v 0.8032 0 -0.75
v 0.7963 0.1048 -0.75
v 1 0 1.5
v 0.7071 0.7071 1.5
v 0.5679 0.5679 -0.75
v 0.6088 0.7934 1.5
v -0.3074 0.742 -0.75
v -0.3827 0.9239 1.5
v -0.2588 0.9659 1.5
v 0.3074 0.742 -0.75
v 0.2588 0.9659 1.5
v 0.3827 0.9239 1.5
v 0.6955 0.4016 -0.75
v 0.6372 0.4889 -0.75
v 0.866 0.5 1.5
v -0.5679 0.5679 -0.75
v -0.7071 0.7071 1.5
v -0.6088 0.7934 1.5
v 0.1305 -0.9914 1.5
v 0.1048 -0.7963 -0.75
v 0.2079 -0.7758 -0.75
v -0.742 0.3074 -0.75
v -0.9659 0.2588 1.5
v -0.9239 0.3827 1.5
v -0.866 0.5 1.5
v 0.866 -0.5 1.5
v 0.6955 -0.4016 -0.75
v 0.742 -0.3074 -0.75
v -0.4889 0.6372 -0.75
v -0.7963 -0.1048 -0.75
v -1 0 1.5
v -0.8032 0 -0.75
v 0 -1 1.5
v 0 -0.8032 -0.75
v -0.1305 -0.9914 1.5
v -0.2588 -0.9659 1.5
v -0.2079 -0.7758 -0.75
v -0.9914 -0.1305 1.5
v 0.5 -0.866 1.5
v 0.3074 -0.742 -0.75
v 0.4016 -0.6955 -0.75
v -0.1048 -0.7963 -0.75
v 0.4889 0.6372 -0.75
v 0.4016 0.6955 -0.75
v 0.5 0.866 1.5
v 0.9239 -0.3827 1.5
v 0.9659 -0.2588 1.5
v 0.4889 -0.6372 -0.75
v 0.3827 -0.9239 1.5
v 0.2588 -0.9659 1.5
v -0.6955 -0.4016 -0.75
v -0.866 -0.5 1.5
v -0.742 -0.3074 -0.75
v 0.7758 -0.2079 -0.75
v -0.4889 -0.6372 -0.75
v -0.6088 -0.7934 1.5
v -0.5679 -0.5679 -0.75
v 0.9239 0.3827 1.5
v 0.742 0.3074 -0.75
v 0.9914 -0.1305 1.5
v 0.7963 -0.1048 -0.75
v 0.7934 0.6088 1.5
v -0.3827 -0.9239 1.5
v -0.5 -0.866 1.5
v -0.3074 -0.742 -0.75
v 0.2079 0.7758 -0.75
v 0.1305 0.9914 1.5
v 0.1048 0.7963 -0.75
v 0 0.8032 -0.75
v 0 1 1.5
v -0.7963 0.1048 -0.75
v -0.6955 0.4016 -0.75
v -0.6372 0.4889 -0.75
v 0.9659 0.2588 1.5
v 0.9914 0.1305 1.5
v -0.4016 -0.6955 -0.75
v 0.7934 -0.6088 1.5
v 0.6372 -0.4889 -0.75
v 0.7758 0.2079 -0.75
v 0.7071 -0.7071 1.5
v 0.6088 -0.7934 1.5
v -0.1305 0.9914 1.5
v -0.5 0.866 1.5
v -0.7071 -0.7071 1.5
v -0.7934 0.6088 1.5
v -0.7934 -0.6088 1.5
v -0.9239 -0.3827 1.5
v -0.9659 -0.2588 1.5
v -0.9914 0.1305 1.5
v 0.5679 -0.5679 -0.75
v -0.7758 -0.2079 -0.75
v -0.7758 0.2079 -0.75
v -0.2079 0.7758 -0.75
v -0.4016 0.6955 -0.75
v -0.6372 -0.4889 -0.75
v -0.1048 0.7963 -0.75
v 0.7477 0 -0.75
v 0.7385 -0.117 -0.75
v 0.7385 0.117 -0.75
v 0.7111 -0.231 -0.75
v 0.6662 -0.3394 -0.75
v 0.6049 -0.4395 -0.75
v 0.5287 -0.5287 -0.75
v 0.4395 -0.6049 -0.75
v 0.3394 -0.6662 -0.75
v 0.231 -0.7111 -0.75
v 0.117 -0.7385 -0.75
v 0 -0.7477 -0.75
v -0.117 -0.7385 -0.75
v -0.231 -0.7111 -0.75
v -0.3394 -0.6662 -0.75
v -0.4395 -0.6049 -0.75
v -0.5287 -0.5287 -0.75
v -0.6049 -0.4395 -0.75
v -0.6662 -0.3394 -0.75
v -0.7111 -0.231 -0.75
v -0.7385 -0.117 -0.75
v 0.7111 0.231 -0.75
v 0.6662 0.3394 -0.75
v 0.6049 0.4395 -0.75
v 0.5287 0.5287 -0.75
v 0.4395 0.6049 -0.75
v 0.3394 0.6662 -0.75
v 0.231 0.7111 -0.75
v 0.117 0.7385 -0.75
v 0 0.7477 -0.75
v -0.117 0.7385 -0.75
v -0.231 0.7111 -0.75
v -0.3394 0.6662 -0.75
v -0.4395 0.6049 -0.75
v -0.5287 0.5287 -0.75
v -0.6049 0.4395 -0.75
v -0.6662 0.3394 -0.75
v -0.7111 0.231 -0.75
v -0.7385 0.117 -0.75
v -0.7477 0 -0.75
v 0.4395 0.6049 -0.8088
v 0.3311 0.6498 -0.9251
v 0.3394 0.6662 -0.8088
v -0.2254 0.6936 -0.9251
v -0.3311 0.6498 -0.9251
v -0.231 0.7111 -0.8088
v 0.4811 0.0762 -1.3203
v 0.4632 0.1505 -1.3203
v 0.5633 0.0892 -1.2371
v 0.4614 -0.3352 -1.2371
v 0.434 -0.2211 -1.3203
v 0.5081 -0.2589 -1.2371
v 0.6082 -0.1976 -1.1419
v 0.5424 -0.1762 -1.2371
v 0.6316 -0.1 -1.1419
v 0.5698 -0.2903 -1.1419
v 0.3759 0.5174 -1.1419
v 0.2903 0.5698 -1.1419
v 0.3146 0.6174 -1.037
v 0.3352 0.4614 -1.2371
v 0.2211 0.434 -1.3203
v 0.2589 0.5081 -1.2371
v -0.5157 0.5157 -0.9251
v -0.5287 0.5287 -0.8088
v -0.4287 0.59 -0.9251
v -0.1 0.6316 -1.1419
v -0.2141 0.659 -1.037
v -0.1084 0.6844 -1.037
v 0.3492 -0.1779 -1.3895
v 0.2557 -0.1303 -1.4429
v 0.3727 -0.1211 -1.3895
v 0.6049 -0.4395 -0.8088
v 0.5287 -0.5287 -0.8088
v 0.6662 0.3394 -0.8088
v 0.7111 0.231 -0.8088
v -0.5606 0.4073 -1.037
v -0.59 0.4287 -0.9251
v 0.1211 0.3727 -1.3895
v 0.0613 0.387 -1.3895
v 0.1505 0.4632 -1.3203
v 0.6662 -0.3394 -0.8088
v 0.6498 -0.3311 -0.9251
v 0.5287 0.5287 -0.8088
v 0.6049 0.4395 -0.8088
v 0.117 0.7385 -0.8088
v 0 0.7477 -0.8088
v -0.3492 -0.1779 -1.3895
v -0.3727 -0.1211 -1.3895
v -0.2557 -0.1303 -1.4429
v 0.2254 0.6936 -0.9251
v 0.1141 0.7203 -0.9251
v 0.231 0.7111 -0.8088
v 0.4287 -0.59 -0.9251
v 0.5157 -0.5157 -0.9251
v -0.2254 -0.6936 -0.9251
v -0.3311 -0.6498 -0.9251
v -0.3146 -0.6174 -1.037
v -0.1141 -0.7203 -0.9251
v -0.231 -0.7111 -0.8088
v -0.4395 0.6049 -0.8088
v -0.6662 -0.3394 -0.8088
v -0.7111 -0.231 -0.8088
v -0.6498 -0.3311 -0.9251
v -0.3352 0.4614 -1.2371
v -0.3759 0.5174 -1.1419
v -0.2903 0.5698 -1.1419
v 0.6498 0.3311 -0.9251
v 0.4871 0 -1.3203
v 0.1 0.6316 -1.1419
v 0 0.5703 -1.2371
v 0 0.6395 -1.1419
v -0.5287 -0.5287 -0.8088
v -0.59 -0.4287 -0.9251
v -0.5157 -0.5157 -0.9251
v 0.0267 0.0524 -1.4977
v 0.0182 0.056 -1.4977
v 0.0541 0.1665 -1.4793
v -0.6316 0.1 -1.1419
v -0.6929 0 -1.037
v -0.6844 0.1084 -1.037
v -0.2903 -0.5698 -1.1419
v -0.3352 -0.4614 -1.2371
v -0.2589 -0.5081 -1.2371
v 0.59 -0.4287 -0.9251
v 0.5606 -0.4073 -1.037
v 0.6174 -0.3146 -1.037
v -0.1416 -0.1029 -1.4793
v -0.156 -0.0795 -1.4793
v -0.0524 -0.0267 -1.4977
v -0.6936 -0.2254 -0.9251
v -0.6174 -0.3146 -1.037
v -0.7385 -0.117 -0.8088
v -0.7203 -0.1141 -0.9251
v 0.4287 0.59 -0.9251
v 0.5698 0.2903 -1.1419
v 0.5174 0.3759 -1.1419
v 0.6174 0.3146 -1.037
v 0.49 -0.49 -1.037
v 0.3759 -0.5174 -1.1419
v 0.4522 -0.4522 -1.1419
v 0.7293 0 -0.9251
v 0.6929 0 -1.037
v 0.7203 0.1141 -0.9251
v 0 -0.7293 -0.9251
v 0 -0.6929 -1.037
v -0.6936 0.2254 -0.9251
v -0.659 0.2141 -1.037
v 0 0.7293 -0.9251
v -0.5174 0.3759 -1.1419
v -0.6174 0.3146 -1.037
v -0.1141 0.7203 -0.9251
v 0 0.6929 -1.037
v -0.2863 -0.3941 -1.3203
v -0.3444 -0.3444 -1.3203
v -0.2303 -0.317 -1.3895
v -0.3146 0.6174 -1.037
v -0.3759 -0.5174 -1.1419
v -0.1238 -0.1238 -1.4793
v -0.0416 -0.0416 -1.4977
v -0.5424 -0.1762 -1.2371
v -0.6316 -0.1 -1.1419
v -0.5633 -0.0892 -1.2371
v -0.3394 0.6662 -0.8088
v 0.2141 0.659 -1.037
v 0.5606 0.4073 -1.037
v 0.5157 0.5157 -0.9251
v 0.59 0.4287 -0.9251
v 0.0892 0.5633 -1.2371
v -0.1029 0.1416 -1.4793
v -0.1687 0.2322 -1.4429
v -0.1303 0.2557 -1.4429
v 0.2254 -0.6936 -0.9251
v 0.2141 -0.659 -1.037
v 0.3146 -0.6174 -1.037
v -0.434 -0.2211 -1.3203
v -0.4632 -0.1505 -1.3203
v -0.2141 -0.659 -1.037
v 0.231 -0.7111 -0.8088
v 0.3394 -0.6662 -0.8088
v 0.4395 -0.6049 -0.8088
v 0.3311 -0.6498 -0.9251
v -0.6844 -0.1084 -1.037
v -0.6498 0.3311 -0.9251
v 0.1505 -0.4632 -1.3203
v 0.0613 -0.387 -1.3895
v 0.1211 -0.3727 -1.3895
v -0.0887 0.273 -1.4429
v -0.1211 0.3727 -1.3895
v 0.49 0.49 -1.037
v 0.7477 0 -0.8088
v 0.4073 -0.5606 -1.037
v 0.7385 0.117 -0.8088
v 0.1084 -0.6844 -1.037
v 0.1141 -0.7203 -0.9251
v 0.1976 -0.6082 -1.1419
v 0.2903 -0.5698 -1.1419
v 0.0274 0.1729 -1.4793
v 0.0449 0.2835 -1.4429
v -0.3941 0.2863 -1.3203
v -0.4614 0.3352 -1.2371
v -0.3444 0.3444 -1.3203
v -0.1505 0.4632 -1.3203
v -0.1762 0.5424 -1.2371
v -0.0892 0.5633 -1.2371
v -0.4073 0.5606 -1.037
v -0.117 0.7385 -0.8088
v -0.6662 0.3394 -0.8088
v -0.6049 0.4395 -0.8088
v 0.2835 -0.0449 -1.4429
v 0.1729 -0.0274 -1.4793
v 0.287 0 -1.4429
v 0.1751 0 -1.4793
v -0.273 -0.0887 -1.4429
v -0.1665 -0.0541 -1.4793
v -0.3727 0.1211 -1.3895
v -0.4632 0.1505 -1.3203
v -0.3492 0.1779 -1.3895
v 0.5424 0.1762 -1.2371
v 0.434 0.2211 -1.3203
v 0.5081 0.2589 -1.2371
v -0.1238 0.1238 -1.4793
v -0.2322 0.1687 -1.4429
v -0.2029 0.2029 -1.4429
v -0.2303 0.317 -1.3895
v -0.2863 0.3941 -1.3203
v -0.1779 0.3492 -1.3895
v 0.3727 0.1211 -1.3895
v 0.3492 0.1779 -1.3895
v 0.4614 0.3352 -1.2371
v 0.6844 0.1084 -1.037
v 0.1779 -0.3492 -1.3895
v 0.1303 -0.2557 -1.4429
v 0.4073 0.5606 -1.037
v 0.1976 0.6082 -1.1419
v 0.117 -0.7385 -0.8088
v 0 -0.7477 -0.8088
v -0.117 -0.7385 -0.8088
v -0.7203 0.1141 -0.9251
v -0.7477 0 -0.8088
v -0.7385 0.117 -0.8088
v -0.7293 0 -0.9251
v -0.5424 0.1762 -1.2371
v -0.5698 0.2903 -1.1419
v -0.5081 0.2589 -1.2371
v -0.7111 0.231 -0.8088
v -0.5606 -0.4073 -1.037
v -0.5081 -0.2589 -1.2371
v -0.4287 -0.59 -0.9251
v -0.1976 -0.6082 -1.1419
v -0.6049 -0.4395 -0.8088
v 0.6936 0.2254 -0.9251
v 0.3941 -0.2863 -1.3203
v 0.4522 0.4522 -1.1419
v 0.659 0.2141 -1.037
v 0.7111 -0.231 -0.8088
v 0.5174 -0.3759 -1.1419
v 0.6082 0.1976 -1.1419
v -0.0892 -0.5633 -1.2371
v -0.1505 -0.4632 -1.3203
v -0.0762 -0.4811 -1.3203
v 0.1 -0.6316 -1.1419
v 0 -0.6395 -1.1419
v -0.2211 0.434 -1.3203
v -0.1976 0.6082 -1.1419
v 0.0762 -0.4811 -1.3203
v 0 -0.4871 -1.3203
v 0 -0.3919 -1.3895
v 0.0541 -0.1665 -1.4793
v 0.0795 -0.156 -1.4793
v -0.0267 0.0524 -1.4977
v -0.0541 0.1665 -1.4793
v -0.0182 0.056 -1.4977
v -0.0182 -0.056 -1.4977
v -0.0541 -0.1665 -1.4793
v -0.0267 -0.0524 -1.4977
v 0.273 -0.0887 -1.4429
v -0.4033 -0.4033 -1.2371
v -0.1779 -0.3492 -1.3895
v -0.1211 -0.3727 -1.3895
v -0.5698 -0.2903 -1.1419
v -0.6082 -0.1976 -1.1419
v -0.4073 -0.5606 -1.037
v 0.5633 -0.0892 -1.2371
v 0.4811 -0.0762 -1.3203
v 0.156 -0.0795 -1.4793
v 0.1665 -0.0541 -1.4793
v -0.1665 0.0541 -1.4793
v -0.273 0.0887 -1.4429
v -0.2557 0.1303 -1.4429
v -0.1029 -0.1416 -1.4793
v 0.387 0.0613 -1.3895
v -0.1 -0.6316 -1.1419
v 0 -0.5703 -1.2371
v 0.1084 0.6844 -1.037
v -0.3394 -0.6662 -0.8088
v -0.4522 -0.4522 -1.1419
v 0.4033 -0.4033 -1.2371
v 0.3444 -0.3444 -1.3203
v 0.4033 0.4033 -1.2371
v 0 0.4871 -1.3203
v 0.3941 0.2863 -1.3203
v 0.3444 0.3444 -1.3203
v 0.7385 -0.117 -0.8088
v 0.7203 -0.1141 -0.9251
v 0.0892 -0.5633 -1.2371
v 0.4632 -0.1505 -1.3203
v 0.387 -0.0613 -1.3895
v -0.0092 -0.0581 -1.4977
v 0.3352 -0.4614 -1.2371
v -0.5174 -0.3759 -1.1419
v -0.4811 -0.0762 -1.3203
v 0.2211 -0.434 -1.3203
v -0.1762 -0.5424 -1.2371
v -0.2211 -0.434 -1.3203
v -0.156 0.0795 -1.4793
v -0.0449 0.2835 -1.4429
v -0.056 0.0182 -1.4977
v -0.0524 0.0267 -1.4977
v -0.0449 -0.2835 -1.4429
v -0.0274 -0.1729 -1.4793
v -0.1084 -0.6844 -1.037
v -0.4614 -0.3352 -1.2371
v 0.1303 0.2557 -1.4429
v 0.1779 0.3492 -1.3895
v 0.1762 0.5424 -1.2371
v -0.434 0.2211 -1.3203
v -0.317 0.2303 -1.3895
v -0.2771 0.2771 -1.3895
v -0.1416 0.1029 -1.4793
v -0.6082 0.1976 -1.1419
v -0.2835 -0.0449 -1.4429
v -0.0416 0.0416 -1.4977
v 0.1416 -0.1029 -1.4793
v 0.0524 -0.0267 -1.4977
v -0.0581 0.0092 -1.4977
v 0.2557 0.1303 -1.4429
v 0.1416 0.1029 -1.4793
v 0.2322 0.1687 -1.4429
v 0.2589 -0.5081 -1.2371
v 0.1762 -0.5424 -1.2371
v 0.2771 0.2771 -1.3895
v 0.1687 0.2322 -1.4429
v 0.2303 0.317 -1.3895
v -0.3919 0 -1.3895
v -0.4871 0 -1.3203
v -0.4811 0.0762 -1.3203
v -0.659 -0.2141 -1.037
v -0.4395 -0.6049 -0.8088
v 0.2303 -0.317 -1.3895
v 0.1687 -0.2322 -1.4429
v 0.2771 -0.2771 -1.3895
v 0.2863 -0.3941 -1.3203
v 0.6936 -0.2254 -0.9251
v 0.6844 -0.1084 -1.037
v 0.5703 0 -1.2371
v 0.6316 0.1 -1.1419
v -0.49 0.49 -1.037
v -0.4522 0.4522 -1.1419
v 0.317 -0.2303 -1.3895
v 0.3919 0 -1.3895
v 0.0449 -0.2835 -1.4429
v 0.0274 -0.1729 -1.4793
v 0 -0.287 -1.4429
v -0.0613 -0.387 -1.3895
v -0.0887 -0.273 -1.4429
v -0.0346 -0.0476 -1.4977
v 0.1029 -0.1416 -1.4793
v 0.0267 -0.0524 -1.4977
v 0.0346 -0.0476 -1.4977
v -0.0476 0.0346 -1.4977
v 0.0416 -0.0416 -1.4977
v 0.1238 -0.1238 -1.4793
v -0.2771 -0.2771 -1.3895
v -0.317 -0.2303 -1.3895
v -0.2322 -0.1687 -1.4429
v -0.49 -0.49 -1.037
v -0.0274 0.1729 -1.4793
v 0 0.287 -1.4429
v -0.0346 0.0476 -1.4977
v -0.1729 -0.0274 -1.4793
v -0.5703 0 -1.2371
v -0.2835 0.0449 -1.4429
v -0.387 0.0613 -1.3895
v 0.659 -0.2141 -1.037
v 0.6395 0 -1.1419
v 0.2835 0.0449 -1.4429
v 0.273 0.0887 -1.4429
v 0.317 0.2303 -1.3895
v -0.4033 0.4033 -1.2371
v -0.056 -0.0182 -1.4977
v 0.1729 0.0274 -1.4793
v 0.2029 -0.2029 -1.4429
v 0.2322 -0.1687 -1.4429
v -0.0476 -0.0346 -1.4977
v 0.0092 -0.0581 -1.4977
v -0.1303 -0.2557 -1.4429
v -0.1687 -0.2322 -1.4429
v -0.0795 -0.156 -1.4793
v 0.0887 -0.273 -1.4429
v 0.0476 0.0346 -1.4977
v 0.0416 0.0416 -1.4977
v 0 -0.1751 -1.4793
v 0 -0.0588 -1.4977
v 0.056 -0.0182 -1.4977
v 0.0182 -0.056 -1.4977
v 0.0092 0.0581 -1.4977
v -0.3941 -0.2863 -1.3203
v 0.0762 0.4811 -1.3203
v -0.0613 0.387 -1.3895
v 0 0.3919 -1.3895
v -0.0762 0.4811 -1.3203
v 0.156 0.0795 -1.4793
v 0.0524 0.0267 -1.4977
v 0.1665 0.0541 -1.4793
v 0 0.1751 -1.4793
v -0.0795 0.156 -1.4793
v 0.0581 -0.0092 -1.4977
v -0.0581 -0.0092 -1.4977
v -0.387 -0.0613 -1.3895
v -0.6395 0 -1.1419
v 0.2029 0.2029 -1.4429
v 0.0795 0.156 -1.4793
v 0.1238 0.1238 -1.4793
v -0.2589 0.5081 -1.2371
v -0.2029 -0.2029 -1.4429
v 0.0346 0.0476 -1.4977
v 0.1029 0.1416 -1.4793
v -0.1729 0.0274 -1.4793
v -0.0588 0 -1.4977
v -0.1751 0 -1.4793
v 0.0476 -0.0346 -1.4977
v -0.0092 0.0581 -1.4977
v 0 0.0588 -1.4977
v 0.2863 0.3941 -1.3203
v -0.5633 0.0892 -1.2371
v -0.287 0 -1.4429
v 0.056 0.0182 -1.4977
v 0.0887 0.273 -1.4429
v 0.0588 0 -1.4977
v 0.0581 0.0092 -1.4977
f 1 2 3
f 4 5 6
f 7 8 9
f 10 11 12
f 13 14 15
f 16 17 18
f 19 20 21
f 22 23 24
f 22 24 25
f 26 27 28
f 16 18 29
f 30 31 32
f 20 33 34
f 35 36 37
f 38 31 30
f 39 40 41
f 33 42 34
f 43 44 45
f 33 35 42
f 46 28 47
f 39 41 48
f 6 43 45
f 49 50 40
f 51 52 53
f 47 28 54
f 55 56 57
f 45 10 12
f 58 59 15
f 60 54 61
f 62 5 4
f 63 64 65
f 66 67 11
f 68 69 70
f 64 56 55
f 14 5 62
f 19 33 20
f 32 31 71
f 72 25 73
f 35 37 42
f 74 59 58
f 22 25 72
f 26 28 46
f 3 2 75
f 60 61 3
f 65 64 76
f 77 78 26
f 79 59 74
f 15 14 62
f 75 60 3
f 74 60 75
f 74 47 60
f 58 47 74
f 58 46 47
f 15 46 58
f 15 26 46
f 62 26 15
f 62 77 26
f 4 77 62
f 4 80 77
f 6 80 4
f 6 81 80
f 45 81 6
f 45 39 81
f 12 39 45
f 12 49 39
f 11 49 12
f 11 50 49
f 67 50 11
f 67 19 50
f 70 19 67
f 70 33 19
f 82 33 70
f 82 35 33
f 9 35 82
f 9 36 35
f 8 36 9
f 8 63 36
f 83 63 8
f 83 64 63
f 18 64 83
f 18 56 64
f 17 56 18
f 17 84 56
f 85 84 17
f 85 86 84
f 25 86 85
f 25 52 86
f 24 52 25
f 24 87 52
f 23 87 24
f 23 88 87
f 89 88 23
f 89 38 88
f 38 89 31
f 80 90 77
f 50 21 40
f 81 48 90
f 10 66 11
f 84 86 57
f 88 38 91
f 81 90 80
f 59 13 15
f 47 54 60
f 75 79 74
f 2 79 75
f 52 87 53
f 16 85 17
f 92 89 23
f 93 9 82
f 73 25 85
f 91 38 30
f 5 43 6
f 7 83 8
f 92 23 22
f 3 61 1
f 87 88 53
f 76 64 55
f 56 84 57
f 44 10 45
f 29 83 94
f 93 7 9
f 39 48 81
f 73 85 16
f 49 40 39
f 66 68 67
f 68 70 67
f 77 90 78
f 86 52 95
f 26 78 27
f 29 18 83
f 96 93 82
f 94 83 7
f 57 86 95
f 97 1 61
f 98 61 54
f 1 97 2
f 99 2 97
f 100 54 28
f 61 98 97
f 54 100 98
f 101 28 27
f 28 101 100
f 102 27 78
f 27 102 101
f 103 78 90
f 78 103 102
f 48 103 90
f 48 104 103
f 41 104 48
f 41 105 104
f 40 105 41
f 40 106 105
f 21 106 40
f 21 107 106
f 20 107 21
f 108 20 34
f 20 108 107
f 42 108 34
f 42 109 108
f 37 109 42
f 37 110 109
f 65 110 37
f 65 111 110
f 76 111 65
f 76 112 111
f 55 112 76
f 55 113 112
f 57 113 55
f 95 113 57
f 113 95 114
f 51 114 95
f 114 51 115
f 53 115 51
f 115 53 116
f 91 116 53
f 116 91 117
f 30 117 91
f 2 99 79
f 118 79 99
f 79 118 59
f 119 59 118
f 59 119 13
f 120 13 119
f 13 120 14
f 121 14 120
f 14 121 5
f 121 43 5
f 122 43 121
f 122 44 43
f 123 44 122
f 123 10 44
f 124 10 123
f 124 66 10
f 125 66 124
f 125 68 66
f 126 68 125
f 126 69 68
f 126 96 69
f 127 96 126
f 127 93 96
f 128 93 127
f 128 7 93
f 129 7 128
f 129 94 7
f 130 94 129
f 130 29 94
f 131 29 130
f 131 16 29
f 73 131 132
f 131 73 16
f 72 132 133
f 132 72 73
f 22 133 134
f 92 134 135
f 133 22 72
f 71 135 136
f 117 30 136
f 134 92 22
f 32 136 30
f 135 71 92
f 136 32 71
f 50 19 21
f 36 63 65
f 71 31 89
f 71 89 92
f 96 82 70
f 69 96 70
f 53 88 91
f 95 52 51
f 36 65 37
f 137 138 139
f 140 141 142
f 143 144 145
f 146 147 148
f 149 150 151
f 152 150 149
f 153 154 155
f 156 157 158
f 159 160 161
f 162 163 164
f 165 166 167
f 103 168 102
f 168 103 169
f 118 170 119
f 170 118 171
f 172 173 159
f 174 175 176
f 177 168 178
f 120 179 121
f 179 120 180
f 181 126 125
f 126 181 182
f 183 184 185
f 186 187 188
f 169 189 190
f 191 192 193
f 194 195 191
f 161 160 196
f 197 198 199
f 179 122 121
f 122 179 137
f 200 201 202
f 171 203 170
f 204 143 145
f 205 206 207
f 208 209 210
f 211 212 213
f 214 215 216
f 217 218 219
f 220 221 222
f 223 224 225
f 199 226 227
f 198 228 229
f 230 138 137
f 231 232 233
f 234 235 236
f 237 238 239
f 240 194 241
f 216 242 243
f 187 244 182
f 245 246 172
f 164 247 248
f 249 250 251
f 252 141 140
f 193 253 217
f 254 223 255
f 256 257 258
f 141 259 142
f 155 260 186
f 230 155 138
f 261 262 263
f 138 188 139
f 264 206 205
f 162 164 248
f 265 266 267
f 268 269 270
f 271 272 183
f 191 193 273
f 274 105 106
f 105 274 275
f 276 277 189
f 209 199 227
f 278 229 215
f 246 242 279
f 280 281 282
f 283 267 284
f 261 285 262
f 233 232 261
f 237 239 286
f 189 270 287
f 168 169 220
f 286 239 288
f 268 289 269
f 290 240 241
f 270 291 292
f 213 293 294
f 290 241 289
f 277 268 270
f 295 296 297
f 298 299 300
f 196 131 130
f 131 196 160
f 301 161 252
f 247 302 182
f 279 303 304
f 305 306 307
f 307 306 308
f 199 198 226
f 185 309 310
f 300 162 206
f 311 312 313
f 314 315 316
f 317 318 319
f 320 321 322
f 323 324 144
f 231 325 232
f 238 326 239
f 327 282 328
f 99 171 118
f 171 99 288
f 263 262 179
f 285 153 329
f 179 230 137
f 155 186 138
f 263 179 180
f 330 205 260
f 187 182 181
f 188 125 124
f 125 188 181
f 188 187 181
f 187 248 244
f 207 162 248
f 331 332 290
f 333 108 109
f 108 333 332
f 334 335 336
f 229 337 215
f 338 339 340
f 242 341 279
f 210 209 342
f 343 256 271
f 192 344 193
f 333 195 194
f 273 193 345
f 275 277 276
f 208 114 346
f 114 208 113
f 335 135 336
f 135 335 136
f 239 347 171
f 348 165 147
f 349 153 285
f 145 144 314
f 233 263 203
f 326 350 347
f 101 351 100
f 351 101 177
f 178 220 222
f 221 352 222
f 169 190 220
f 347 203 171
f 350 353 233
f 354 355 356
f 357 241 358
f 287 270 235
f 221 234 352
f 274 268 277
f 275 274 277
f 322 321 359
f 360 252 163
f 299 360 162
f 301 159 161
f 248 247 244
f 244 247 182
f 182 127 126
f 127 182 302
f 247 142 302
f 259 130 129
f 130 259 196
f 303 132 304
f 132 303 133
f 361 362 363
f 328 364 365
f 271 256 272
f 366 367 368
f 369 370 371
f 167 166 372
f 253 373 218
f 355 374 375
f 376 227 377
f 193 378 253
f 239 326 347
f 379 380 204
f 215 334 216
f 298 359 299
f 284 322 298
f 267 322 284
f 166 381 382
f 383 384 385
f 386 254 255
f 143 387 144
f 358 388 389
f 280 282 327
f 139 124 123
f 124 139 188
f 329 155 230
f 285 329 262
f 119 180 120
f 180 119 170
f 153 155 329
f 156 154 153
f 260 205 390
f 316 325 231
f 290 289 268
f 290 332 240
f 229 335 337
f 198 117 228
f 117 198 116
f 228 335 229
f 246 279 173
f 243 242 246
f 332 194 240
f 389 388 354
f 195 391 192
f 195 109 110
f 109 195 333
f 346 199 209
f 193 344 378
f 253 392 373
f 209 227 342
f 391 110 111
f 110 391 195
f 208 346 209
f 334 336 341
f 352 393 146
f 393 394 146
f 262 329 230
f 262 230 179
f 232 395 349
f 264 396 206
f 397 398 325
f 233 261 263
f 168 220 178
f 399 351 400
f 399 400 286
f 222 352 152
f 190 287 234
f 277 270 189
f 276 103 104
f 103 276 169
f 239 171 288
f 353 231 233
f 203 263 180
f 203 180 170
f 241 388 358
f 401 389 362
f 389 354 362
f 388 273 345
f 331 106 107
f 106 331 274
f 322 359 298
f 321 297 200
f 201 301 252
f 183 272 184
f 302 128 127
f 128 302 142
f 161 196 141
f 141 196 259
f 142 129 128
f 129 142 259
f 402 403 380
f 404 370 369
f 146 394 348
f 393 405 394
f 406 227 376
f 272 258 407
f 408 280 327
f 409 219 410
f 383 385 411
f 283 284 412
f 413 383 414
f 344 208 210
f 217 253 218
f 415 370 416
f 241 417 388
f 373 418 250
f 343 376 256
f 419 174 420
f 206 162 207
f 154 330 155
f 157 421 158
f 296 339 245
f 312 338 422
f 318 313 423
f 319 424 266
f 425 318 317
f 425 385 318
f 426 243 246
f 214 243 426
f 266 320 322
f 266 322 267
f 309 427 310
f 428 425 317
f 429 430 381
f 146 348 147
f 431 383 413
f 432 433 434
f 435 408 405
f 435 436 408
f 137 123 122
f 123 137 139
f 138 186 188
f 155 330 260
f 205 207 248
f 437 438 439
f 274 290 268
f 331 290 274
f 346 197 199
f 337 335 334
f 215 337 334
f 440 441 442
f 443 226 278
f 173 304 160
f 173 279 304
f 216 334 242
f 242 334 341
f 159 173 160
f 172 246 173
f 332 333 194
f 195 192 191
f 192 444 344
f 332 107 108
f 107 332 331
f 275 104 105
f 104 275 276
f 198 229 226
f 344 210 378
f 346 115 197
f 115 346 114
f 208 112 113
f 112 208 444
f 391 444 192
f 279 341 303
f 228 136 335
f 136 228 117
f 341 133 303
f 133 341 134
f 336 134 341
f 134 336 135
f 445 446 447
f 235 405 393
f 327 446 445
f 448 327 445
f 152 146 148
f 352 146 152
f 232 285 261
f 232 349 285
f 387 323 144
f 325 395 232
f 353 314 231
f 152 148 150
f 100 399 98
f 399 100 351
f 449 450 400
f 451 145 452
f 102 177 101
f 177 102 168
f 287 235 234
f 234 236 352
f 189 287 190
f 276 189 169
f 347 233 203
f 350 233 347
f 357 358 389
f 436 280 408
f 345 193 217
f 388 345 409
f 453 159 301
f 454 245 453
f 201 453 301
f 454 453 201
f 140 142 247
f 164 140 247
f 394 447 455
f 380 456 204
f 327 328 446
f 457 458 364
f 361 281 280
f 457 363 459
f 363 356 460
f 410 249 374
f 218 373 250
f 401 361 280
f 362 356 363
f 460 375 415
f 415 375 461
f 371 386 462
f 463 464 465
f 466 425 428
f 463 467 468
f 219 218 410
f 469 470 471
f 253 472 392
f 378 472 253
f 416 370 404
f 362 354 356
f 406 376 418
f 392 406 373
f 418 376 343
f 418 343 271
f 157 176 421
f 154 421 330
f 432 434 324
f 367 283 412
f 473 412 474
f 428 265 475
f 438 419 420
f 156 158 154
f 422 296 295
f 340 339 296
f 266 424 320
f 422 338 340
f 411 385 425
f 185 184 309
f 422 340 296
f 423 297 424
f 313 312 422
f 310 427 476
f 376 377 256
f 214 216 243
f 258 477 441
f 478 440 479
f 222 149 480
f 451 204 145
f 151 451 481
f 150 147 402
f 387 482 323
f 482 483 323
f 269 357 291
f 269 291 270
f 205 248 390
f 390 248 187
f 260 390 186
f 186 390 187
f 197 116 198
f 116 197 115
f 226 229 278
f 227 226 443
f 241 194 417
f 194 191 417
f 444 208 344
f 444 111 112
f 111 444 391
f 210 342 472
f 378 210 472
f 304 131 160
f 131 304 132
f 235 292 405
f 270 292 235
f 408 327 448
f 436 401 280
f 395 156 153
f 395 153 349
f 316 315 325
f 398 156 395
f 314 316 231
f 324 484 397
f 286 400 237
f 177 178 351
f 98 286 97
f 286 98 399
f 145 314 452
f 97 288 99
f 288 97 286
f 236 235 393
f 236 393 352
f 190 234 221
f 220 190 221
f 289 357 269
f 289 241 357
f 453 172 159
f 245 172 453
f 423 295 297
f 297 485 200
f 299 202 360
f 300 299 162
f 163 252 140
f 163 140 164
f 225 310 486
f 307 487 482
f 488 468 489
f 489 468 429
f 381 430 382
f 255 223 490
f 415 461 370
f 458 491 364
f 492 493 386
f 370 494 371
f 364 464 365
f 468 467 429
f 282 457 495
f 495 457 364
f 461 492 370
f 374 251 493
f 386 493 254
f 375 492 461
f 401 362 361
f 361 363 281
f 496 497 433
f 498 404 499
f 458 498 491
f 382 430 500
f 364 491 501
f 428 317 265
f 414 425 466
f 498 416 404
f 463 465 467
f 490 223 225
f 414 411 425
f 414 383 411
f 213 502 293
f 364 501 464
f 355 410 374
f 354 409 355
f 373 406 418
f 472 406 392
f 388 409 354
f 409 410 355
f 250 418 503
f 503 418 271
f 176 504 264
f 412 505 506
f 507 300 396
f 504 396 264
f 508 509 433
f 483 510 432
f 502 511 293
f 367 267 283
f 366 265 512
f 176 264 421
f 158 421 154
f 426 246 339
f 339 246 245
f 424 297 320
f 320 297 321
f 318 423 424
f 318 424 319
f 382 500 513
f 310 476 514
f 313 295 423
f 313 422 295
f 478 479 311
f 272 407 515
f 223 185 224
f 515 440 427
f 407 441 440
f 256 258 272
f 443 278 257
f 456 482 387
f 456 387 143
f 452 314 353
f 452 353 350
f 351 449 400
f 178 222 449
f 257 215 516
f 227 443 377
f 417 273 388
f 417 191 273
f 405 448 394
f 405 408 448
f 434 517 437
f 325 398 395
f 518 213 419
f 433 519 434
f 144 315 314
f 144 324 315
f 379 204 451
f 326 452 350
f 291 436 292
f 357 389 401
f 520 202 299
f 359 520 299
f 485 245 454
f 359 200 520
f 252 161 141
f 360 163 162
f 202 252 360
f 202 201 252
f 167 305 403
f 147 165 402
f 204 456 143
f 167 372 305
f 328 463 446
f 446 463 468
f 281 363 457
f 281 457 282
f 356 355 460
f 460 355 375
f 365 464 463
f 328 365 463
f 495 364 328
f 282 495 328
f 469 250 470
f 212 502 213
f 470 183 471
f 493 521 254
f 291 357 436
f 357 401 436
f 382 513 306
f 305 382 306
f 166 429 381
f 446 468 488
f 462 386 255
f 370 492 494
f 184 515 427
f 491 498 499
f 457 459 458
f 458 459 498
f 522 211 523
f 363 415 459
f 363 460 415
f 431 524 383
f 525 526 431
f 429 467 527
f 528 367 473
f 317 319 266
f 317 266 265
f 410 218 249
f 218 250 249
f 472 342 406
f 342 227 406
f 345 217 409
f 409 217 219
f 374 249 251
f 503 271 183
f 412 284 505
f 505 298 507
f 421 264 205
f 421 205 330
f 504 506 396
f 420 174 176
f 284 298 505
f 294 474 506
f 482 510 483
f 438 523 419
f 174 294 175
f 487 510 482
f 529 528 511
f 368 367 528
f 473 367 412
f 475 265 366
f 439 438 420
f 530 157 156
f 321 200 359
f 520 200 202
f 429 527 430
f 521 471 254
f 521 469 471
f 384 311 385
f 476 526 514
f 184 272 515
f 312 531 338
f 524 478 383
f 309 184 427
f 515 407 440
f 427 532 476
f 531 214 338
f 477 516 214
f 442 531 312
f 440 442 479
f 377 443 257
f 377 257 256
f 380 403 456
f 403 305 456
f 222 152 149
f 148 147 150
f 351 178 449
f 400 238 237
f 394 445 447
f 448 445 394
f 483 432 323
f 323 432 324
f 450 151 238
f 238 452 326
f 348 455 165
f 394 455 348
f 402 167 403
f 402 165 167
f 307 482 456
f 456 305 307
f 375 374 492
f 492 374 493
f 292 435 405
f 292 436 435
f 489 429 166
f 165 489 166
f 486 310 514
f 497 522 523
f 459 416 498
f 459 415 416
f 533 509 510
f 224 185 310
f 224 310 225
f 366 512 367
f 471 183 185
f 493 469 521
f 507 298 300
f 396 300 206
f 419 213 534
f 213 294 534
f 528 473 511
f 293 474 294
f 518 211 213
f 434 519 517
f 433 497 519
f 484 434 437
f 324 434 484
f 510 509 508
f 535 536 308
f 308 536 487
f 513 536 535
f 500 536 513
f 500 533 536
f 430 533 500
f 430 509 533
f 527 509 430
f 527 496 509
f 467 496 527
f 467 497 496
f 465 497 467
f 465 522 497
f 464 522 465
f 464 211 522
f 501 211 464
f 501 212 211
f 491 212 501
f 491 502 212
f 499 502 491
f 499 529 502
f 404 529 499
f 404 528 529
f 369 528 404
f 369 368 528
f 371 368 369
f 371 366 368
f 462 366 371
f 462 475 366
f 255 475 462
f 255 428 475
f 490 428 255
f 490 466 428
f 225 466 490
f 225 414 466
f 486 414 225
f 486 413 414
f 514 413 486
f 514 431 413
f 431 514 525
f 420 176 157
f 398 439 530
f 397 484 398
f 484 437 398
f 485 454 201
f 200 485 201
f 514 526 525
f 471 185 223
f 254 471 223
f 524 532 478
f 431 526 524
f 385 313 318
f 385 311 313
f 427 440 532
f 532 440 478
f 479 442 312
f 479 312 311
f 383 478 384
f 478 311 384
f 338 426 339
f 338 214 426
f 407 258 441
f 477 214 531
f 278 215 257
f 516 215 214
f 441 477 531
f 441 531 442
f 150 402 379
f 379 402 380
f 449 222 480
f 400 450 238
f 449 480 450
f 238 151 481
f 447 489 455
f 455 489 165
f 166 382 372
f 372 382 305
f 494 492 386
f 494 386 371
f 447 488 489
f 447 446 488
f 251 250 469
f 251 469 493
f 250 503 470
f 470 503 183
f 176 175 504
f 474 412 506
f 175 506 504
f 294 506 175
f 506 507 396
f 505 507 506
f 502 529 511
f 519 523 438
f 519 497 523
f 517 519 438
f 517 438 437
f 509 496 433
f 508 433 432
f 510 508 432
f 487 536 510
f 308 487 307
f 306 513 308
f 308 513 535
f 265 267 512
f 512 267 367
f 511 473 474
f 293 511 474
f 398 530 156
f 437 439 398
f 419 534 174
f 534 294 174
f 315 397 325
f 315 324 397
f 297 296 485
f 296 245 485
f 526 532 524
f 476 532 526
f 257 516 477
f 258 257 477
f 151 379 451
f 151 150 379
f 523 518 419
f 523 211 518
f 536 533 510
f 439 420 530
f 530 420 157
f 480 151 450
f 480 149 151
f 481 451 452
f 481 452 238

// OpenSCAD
// part_id: b16
// name: B16 rivet
// source_drawing_ids: DRW-002
// units: mm
// revision: 0.1
// SPDX-License-Identifier: MIT

module part_b16(body_d = 2.0, body_h = 3.0, taper_angle = 10, tip_r = 0.75) {
    taper_half_angle = taper_angle / 2;
    taper_h = max(0.1, body_h - tip_r);
    lower_d = max(2 * tip_r, body_d - 2 * taper_h * tan(taper_half_angle));

    translate([0, 0, -body_h / 2])
        union() {
            translate([0, 0, tip_r])
                cylinder(d1 = lower_d, d2 = body_d, h = taper_h, center = false, $fn = 48);
            translate([0, 0, tip_r])
                sphere(r = tip_r, $fn = 40);
        }
}

// ---- "main guard" ----
// Default to previewing when opened directly:
if (is_undef(__LIB_MODE__)) {
    part_b16();
}
